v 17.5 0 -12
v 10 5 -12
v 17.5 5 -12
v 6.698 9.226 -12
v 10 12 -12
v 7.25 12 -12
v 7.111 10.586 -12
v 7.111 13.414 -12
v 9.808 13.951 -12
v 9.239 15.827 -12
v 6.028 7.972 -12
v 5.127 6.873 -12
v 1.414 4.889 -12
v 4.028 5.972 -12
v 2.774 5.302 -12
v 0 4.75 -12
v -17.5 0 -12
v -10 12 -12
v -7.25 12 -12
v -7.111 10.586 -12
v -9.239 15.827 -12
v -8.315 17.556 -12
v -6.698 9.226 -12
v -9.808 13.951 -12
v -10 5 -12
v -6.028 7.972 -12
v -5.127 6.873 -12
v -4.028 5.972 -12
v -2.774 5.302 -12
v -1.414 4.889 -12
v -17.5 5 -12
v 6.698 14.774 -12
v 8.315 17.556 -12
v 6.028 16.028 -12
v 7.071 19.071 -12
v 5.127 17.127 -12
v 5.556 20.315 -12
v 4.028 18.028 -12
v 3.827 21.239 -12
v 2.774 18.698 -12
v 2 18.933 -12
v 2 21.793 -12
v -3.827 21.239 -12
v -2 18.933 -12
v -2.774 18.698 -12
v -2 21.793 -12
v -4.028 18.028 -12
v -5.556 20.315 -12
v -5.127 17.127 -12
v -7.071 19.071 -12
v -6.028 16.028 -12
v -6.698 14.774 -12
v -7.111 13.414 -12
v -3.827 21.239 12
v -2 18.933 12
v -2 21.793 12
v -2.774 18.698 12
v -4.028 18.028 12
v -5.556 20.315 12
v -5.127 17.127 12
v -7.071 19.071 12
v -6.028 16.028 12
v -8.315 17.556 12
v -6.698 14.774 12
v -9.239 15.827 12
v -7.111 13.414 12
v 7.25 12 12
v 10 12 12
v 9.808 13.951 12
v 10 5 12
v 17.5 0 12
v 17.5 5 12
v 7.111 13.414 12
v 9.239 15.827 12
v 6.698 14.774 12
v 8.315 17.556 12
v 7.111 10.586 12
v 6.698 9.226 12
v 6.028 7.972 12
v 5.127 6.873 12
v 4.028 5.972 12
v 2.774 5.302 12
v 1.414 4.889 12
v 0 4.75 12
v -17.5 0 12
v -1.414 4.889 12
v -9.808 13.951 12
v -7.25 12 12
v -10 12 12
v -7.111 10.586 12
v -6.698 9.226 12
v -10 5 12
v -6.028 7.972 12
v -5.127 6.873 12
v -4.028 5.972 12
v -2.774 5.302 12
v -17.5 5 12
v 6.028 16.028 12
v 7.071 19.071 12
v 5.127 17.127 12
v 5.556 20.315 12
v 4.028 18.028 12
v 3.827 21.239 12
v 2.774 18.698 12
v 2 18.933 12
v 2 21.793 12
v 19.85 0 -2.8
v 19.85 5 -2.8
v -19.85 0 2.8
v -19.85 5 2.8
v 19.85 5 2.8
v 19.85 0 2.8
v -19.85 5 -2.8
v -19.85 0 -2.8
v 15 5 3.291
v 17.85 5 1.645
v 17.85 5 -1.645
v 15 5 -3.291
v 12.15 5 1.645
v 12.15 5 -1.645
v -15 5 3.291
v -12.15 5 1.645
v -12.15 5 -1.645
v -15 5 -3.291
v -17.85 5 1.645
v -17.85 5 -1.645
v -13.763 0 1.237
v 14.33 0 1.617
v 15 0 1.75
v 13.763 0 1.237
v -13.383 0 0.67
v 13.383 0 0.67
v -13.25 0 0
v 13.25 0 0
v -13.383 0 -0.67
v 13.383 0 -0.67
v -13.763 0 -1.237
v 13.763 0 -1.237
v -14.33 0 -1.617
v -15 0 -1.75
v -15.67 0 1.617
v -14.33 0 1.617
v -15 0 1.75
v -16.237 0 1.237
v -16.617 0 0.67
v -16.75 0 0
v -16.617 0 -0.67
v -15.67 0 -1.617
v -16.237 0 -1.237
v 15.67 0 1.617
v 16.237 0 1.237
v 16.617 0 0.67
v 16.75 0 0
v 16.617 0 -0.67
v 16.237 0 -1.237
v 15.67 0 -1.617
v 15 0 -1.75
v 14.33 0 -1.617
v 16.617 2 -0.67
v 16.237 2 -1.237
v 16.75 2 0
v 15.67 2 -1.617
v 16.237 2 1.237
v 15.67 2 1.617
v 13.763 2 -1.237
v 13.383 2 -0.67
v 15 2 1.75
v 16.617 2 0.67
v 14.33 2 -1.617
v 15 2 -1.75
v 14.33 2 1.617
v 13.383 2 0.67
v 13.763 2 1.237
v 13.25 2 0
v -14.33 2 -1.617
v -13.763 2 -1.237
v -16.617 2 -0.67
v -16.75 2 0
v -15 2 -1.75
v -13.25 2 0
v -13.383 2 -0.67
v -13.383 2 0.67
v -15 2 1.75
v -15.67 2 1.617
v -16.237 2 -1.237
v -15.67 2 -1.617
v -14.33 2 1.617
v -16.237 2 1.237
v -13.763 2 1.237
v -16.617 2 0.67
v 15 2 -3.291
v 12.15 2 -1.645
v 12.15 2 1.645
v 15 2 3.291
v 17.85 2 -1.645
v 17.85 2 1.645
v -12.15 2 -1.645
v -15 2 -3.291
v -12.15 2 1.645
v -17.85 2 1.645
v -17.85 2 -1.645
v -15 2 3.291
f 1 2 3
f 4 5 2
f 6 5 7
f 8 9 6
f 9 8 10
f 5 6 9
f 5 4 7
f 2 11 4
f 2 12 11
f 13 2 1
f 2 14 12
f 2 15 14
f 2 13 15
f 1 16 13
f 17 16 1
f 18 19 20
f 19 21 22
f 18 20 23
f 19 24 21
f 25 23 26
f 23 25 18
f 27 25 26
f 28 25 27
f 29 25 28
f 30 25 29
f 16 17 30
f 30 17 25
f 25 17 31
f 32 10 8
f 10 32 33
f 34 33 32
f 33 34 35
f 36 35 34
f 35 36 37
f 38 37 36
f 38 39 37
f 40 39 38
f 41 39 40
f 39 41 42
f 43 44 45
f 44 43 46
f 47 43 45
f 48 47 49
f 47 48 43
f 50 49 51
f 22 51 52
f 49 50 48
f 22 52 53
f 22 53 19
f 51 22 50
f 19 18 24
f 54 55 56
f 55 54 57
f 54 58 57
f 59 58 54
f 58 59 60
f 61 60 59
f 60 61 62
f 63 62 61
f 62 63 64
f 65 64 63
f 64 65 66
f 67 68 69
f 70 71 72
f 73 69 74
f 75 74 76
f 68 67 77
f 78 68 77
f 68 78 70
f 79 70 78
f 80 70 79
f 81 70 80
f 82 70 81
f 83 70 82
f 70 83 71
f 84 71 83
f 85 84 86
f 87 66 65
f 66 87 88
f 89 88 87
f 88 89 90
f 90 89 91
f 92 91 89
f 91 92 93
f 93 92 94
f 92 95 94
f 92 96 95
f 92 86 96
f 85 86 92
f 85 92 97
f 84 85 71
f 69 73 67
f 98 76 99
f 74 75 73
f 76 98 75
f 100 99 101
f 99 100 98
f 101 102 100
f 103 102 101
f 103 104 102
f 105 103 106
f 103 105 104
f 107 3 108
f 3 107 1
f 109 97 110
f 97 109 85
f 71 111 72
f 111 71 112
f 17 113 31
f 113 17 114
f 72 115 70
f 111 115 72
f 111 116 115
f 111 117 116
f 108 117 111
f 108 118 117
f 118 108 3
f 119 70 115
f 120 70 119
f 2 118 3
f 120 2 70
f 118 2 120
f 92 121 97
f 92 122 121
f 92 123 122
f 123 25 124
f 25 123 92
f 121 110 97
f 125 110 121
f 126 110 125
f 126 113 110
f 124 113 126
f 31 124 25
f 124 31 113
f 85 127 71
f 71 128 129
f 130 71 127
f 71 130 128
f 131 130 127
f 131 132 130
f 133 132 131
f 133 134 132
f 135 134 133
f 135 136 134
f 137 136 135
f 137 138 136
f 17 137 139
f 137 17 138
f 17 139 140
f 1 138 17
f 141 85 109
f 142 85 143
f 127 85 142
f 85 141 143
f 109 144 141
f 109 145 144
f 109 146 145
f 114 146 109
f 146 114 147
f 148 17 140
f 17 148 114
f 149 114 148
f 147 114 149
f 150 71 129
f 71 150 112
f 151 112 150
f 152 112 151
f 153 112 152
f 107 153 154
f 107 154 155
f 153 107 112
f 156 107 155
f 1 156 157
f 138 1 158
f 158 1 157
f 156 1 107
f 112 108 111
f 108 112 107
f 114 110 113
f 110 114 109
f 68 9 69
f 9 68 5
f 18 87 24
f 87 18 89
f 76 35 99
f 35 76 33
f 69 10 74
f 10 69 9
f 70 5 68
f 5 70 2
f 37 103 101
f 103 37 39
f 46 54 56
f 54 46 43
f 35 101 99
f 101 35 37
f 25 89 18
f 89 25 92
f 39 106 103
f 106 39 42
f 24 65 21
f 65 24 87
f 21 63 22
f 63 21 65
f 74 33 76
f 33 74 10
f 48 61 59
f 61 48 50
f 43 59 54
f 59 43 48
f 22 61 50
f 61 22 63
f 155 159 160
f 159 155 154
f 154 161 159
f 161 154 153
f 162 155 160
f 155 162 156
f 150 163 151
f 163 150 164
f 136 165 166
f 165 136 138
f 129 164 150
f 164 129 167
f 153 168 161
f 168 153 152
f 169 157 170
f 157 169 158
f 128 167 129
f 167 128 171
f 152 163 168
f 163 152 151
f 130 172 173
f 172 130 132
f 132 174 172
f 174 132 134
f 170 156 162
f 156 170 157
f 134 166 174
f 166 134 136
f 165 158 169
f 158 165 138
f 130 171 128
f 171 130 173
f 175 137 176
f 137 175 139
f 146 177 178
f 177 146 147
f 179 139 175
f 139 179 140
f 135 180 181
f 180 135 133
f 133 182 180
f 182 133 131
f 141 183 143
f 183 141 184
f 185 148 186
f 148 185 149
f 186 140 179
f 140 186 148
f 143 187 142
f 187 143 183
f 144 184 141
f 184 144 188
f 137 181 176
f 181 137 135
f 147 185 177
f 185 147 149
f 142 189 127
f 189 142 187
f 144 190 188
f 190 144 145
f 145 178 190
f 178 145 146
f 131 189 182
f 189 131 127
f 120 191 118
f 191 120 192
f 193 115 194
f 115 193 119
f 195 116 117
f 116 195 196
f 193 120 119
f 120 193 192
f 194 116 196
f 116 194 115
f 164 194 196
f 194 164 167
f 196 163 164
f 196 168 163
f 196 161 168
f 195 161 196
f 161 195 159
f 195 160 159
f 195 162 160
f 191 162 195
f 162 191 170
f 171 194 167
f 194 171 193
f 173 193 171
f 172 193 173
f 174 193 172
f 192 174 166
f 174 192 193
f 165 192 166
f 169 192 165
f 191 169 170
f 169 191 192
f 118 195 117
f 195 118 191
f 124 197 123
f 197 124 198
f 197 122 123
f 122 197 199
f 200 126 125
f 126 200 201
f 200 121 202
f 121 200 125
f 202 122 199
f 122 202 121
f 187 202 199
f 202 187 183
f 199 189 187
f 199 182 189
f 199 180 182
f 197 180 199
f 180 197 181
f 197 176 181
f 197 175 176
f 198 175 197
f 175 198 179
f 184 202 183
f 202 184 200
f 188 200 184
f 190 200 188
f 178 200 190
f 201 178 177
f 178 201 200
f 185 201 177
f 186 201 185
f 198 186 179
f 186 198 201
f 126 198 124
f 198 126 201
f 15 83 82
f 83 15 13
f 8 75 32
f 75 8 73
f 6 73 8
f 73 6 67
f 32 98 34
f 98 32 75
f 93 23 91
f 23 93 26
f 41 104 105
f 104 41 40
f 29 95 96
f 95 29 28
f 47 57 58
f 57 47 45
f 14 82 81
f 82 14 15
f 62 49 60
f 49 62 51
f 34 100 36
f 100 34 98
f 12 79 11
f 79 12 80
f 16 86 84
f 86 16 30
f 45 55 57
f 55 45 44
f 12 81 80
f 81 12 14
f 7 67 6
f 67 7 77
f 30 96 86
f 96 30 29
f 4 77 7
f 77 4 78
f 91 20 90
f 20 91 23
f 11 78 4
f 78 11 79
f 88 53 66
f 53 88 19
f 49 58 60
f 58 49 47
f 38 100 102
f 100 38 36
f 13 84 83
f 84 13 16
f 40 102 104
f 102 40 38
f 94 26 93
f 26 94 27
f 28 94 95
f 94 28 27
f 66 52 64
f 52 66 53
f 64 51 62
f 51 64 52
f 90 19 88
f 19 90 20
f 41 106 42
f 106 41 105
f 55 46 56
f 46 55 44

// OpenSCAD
// file: modules.scad
// Fonctions personnalisées

//http://forum.openscad.org/Wish-mirror-copy-true-td10681.html
module copy_mirror(vec=[0,1,0])
{
    children();
    mirror(vec) children();
}

module ecrou(plat,h){
  cylinder(d=plat*2/sqrt(3), h=h, $fn=6);
}


module courroie(diam,longueur){
  color ("black")
  difference(){
    hull(){
      cylinder(d=diam+1, h=6, $fn=32);
      translate([longueur,0,0]) cylinder(d=diam+1, h=6, $fn=32);
    }
    translate([0,0,-1])
    hull(){
      cylinder(d=diam-1, h=8, $fn=32);
      translate([longueur,0,0]) cylinder(d=diam-1, h=8, $fn=32);
    }
  }
  
  
}
// file: config.scad
// Paramètres de la machine

decal=-30;            // décallage du chassis xz
hauteur=400;          // hauteur totale chassis
largeur=350;          // largeur totale chassis
longueur=500;         // longueur totale chassis
hauteur_base=90;      // hauteur de la base
entraxe_y=140;        // distance entre les tiges Ø8 axe Y

couleur=[1,0.6,0];



// Paramètre des pièces et jeux

// écart plateau/courroie
// y_belt_holder
belt_h=13;      // écart entre la courroie et le plateau

// écart plateau/tiges lisses
// y_lm8uu
decal_plateau=12; // Décallage en Y

// décallage des tiges lisses Y
// support_tige8_y
decal_tiges=5;

// décallage moteur Y
// y_motor
decal_motory_z=11;
decal_motory_y=25;

// Plats écrous
ec3=5.7;
ec4=7.2;
ec5=8.2;
ec6=10.2;

// Jeu sur plats pour les écrous glissants
jec=0.2;

// hauteur écrous
ec3h=2.4;
ec4h=3.2;
ec5h=4.7;
ec6h=5.2;

// Vis
vis3=3.5;
vis4=4.5;
vis5=5.5;
vis6=6.5;

// nombre de dents des poulies
poulie=20;
// main file
include <config.scad>;
use <modules.scad>;
//color ("blue", 0.5)
//import ("stl/y_support_plateau.stl");

module y_lm8uu(){
  largeur=35;
  hauteur=24;
  ep=5;
  entraxe=30;
  
  echo ("y_lm8uu");
  
  color (couleur)
  difference(){
    union(){
      // platine de fixation
      hull(){
        translate([-largeur/2,0,-hauteur/2]) cube([largeur,ep,hauteur]);
        copy_mirror([1,0,0]) translate([entraxe/2,0,0]) rotate([-90,90,0]) ecrou(ec3+4, ep);
      }
      // contour lm8uu
      hull(){
        translate([0,decal_plateau,0]) cylinder(d=20,h=hauteur, $fn=32, center=true);
        translate([-20/2,0,-hauteur/2]) cube([20,ep,hauteur]);
      }
      
    }
    // vis et écrous
    copy_mirror([1,0,0]) translate([entraxe/2,-1,0]) rotate([-90,0,0]) cylinder(d=vis3, h=ep+2, $fn=16);
    copy_mirror([1,0,0]) translate([entraxe/2,2,0]) rotate([-90,90,0]) ecrou(ec3,ep);
    
    // passage du lm8uu
    translate([0,decal_plateau,0]) cylinder(d=14.5,h=hauteur+2, $fn=32, center=true);
    translate([-2,decal_plateau,-hauteur/2-1]) cube([4,15,hauteur+2]);
  }
  
  
}

y_lm8uu();
